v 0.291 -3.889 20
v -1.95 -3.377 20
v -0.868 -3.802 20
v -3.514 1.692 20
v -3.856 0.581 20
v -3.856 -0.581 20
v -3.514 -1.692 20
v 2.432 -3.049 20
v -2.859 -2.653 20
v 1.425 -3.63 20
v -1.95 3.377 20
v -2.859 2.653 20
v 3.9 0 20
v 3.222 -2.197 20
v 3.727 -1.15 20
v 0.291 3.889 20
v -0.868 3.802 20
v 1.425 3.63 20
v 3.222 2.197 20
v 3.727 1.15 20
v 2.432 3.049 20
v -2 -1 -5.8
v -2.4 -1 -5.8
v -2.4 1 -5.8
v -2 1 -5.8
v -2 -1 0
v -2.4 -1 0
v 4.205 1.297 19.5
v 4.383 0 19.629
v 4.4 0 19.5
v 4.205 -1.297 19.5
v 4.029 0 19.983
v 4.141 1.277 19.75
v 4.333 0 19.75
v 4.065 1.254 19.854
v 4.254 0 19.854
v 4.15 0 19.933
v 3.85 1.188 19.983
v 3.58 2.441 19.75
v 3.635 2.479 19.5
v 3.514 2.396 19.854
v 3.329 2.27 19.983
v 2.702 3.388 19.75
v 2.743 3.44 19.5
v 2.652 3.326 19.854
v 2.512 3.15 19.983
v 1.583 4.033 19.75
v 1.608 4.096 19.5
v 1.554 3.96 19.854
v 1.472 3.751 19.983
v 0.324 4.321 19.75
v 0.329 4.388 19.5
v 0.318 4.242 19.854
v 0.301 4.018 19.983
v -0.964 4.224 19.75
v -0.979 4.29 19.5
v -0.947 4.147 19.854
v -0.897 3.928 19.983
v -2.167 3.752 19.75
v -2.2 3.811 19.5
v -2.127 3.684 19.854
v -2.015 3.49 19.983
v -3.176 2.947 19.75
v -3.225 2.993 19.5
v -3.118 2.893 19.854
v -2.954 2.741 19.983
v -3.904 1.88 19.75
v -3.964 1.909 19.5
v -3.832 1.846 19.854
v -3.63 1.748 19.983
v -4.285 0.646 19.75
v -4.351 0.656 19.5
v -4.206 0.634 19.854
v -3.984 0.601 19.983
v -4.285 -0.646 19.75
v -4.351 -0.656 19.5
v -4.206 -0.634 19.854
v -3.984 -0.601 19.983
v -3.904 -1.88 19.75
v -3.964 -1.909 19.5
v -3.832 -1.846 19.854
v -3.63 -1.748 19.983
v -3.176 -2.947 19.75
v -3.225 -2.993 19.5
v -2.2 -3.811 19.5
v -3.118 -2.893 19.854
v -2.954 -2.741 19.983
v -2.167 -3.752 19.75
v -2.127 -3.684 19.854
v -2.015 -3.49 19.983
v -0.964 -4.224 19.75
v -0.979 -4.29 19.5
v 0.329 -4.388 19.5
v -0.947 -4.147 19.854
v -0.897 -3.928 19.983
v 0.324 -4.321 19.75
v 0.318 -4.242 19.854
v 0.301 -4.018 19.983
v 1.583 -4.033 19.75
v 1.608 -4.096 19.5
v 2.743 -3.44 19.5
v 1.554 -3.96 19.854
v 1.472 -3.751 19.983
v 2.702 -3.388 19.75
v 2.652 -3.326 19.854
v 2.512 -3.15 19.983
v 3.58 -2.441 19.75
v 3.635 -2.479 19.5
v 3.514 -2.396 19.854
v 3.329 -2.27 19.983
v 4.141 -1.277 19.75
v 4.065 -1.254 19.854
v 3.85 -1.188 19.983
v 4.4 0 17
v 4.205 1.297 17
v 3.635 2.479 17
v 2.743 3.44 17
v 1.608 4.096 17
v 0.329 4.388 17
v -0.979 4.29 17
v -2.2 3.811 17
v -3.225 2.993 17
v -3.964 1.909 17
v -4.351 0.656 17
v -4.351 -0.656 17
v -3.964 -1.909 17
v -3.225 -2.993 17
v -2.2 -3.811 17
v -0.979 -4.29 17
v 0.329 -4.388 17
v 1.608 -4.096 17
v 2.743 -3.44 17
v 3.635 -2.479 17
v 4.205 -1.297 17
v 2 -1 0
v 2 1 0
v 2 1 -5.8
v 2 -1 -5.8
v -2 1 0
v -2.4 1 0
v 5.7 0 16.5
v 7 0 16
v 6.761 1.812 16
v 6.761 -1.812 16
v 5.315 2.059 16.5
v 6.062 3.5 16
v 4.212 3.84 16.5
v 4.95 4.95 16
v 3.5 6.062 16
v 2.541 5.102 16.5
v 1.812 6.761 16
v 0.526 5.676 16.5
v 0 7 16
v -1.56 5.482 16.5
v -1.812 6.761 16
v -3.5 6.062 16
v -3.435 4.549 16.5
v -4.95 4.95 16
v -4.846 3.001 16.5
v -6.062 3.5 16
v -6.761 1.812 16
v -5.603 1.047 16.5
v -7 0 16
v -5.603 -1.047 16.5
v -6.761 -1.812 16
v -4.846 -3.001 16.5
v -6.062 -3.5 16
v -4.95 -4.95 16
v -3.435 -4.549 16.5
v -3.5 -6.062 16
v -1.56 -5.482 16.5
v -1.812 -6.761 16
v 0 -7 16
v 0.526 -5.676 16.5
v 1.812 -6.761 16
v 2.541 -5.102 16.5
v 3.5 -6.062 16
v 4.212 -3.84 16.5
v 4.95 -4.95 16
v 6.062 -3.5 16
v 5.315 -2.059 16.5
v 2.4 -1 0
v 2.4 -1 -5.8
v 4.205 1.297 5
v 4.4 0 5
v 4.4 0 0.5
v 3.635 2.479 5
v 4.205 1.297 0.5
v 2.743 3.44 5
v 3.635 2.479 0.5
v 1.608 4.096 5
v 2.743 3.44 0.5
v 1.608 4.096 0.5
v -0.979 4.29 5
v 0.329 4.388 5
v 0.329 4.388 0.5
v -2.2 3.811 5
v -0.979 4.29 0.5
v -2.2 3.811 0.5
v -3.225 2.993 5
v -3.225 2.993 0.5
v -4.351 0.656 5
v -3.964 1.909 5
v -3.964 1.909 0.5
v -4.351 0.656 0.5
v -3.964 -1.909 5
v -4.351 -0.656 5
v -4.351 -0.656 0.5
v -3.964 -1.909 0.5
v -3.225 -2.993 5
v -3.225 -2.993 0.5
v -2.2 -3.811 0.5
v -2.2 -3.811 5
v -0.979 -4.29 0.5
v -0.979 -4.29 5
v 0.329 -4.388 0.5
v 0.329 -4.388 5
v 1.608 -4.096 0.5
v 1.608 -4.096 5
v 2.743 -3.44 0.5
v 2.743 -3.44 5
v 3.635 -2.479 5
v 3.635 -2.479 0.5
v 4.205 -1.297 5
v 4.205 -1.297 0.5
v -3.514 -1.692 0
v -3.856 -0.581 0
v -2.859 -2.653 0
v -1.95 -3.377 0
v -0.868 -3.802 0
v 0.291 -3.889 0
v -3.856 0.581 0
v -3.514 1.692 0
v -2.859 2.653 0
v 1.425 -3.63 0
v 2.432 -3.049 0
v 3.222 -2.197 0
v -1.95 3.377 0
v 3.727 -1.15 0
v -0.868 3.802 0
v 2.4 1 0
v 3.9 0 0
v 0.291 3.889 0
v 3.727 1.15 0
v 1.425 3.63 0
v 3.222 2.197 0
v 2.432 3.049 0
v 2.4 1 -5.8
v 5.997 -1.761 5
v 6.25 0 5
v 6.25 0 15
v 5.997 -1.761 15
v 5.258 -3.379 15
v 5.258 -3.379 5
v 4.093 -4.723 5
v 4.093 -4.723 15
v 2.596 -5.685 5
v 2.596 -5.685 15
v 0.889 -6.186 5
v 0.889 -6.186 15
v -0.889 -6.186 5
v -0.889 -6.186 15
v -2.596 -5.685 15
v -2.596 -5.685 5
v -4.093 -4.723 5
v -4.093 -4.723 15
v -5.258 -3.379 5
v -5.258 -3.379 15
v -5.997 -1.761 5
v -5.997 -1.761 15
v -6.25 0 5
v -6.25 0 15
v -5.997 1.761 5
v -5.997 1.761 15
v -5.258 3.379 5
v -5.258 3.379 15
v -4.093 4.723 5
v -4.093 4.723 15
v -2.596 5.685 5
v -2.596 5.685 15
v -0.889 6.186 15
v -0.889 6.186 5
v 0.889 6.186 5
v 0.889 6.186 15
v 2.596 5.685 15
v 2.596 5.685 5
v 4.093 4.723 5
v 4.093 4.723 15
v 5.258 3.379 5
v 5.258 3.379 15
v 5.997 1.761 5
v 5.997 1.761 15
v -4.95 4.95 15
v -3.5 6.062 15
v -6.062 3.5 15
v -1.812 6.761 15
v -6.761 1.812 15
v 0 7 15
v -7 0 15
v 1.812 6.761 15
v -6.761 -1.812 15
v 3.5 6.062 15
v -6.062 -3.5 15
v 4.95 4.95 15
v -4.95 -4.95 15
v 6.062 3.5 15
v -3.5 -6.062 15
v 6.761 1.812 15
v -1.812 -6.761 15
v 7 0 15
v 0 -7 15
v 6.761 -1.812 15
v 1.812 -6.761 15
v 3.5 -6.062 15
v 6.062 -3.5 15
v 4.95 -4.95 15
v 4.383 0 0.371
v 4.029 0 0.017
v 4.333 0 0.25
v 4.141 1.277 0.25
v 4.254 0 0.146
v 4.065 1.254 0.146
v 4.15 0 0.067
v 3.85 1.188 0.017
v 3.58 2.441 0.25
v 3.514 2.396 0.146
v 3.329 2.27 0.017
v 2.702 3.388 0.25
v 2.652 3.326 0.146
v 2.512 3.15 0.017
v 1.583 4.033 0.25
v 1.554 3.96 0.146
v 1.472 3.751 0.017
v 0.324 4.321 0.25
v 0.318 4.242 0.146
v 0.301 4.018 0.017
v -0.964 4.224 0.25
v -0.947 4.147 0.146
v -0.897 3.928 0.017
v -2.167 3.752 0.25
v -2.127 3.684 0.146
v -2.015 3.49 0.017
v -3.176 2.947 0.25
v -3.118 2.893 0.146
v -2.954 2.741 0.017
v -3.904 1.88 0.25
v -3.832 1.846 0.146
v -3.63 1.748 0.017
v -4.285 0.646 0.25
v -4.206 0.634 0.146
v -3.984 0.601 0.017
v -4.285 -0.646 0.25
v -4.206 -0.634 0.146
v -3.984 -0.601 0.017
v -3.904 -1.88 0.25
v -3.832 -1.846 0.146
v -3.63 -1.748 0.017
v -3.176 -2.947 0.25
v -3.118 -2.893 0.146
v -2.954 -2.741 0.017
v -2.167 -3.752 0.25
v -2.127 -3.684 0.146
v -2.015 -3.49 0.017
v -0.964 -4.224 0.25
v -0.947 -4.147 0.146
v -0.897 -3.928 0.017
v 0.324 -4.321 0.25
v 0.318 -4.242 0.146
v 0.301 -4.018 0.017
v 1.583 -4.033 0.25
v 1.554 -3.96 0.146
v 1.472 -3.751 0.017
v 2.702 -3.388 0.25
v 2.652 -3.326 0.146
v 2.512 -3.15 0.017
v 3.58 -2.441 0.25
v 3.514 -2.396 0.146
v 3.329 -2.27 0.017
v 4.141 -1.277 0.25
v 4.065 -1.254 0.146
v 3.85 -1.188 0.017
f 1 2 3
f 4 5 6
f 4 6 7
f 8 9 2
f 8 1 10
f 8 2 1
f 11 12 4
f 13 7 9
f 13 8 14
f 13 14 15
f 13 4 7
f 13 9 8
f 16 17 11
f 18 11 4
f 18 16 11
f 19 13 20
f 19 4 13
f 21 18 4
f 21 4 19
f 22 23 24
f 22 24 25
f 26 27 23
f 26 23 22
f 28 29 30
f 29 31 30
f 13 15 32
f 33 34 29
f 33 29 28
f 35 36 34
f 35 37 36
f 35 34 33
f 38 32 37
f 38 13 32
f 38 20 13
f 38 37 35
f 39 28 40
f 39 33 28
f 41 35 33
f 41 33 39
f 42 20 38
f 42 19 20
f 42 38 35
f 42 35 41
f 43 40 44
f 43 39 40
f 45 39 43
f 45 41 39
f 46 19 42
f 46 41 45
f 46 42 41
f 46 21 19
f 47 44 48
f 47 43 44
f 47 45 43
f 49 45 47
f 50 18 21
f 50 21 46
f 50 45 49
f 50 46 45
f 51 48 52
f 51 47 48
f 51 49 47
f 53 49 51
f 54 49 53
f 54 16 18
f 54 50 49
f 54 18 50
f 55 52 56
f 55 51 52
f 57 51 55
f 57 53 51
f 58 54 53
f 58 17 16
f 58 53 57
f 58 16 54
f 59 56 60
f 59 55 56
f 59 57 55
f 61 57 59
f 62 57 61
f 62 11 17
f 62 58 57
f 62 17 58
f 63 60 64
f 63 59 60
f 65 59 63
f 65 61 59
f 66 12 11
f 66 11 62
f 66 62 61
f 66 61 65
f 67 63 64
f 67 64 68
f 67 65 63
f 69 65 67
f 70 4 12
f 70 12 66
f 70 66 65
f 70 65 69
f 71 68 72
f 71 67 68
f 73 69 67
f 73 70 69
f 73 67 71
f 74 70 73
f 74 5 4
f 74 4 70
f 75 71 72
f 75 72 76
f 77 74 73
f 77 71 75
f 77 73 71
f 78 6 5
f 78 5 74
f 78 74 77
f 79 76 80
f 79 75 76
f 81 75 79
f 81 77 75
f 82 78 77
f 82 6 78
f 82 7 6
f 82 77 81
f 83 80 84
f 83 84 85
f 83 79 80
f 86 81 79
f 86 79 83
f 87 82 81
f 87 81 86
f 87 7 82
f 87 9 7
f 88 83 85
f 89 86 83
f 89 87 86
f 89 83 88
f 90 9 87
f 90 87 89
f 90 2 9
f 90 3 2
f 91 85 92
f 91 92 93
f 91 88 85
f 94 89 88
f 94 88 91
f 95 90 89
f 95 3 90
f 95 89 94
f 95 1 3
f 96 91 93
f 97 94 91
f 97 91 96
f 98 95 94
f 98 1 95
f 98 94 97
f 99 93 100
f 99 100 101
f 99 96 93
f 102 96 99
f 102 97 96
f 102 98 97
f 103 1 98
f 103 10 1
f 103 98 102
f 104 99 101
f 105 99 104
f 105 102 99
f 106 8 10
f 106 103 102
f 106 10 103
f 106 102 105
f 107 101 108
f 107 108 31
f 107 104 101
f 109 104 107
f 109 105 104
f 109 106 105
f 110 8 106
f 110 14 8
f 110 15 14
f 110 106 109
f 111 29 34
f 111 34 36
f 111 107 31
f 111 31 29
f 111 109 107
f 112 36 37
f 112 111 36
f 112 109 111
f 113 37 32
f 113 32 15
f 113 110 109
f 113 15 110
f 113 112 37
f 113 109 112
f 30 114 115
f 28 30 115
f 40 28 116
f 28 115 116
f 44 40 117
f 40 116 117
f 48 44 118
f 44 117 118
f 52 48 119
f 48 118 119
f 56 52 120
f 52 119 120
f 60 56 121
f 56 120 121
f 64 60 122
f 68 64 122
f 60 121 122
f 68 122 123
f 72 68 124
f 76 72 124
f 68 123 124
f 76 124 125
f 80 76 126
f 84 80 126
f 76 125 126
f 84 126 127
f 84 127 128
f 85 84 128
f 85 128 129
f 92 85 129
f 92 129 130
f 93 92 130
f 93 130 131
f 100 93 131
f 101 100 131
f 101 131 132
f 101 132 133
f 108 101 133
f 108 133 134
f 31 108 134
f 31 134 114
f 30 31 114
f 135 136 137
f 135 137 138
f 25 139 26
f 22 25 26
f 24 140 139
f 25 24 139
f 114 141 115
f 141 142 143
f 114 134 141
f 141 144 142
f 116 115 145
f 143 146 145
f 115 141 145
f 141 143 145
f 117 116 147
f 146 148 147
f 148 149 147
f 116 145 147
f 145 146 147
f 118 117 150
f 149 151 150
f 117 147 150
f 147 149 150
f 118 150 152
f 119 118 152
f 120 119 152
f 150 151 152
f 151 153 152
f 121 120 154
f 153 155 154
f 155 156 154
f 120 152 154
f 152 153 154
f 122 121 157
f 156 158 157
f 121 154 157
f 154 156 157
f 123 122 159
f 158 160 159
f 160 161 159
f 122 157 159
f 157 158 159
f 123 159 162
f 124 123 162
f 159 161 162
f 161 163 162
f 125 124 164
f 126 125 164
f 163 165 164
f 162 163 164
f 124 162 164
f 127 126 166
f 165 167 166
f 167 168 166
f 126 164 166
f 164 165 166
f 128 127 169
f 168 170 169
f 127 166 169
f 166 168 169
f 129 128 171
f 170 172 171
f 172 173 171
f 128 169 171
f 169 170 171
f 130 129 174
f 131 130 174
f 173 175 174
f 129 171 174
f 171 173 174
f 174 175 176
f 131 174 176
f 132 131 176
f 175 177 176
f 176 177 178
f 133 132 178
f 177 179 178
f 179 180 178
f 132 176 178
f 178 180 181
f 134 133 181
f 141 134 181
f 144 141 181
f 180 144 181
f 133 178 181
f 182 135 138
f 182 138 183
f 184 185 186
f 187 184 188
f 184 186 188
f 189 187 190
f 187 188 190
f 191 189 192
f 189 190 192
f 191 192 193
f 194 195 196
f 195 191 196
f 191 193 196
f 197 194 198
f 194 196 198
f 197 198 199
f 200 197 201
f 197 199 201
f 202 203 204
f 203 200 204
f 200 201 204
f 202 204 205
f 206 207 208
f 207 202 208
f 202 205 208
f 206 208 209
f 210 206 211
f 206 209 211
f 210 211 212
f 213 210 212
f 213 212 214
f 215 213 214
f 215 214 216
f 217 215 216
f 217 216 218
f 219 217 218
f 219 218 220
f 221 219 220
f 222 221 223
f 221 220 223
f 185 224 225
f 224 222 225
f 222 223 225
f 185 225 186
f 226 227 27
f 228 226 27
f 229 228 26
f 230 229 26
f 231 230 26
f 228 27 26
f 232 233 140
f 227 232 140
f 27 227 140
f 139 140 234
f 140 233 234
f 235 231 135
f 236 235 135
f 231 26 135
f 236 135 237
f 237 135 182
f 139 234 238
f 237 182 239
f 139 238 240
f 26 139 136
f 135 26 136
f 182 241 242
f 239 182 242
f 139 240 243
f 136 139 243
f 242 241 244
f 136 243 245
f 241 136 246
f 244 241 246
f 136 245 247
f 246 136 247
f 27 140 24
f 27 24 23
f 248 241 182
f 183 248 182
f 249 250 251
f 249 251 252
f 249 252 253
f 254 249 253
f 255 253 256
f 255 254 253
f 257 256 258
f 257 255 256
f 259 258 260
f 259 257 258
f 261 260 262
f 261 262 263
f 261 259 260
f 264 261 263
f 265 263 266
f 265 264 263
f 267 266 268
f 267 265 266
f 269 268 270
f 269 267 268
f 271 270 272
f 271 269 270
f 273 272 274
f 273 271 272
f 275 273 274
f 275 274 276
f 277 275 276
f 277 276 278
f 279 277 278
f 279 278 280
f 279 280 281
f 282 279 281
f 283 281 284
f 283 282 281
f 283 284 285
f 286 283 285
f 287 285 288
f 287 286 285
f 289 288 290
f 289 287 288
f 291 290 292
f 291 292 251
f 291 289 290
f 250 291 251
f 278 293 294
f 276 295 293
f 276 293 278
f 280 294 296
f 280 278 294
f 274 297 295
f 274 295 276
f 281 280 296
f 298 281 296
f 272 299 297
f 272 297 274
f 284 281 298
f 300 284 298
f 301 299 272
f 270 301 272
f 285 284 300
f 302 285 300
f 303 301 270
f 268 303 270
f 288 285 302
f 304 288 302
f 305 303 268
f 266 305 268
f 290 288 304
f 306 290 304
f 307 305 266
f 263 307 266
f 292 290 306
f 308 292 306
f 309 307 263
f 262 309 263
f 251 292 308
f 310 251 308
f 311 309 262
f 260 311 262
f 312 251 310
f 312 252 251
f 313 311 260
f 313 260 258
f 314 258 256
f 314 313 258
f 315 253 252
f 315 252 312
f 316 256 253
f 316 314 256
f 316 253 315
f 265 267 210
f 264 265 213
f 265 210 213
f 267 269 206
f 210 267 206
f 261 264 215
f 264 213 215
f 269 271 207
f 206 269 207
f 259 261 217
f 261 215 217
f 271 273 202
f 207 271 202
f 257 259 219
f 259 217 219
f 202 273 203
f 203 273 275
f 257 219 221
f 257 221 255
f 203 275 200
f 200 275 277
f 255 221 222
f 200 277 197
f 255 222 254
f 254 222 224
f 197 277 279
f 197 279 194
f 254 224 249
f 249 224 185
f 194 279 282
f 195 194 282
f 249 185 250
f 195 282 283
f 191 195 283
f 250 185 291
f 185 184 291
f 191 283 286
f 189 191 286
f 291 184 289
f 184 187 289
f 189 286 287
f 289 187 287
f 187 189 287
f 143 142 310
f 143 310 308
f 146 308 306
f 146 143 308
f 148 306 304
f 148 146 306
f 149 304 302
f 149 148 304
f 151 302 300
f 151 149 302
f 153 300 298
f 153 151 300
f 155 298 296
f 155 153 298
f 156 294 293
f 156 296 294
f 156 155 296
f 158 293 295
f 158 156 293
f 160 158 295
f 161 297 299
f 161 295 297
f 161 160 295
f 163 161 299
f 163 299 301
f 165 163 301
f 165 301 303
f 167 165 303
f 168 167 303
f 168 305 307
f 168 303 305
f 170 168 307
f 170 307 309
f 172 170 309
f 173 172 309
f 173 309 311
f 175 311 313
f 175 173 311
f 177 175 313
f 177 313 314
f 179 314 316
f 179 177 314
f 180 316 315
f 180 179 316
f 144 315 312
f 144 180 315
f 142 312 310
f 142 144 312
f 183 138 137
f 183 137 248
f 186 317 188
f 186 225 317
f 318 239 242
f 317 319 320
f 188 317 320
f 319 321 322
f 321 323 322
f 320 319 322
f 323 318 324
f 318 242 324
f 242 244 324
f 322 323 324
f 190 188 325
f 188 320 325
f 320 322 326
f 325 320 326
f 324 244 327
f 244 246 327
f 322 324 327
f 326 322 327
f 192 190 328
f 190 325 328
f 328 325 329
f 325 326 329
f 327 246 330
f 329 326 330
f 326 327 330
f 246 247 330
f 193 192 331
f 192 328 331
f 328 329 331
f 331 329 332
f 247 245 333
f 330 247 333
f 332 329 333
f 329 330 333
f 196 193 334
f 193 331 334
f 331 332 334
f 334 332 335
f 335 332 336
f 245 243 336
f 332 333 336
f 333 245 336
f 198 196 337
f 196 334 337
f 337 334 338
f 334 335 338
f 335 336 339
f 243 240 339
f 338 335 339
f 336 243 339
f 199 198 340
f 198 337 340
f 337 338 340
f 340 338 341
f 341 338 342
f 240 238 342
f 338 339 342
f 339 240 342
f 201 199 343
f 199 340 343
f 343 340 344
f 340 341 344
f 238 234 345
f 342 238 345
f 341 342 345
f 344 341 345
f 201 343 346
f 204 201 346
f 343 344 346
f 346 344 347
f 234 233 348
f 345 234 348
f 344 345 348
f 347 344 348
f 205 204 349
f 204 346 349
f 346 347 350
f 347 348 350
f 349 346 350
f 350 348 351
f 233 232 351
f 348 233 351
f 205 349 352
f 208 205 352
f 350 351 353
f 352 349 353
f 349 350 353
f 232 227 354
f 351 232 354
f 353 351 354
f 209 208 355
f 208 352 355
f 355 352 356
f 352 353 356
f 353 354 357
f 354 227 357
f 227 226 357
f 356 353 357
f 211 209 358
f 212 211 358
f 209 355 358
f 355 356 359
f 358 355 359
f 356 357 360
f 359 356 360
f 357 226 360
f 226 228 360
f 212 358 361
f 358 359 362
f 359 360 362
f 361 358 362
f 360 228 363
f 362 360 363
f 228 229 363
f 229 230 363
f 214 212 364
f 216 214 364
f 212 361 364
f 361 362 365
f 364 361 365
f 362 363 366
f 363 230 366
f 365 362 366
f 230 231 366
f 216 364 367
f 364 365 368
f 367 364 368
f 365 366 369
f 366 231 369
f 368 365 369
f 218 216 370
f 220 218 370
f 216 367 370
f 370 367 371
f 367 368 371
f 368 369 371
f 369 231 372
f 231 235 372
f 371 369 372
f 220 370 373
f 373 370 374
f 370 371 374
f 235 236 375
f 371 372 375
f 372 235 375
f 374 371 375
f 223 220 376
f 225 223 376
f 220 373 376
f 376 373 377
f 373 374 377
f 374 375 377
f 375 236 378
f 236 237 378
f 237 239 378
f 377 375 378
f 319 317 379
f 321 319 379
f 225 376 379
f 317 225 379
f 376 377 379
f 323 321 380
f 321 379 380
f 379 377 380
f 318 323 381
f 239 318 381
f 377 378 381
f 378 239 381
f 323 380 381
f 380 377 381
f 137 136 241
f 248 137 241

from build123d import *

# Parameters (mm, degrees)
F0_R      = 4.4
F1_DEPTH  = 20
F2_R      = 0.5
F4_R      = 7
F5_DEPTH  = 12
F6_W      = 0.4
F6_H      = 2
F7_DEPTH  = 5.8
F8_SIZE2  = 0.99999
F8_SIZE   = 2.59999
F9_R      = 7
F9_R_2    = 6.25
F10_DEPTH = 10


# Not quite as in the source:
# - a fillet or chamfer is up to 0.001 mm smaller than in the source, because OpenCascade refuses the exact size


with BuildPart() as f1:
    # F0 (on Top) → F1 (new body)
    with BuildSketch(Plane.XY):
        Circle(F0_R)
    extrude(amount=F1_DEPTH)

    # F2
    f2_edges = [f1.edges().sort_by_distance(p)[0] for p in [
        (-4.4, 0, 20),
        (-4.4, 0, 0),
    ]]
    fillet(f2_edges, radius=F2_R)

    # F4 (on offset) → F5 (join)
    with BuildSketch(Plane.XY.offset(17)):
        Circle(F4_R)
    extrude(amount=-F5_DEPTH)

    # F6 (on face) → F7 (join)
    with BuildSketch(Plane(origin=(0, 0, 0), x_dir=(1, 0, 0), z_dir=(0, 0, -1))):
        with Locations((-2.2, 0)):
            Rectangle(F6_W, F6_H)
        with Locations((2.2, 0)):
            Rectangle(F6_W, F6_H)
    extrude(amount=F7_DEPTH)

    # F8 (size 2.6 and 1 in the source; OpenCascade refuses exactly that, so slightly less here)
    f8_edges = [f1.edges().sort_by_distance(p)[0] for p in [
        (-7, 0, 17),
    ]]
    f8_side = f1.faces().sort_by_distance((-6.80201, 0, 17))[0]
    chamfer(f8_edges, length=F8_SIZE, length2=F8_SIZE2, reference=f8_side)

    # F9 (on face) → F10 (cut)
    with BuildSketch(Plane(origin=(0, 0, 5), x_dir=(1, 0, 0), z_dir=(0, 0, -1))):
        Circle(F9_R)
        Circle(F9_R_2, mode=Mode.SUBTRACT)
    extrude(amount=-F10_DEPTH, mode=Mode.SUBTRACT)


solid = f1.part
